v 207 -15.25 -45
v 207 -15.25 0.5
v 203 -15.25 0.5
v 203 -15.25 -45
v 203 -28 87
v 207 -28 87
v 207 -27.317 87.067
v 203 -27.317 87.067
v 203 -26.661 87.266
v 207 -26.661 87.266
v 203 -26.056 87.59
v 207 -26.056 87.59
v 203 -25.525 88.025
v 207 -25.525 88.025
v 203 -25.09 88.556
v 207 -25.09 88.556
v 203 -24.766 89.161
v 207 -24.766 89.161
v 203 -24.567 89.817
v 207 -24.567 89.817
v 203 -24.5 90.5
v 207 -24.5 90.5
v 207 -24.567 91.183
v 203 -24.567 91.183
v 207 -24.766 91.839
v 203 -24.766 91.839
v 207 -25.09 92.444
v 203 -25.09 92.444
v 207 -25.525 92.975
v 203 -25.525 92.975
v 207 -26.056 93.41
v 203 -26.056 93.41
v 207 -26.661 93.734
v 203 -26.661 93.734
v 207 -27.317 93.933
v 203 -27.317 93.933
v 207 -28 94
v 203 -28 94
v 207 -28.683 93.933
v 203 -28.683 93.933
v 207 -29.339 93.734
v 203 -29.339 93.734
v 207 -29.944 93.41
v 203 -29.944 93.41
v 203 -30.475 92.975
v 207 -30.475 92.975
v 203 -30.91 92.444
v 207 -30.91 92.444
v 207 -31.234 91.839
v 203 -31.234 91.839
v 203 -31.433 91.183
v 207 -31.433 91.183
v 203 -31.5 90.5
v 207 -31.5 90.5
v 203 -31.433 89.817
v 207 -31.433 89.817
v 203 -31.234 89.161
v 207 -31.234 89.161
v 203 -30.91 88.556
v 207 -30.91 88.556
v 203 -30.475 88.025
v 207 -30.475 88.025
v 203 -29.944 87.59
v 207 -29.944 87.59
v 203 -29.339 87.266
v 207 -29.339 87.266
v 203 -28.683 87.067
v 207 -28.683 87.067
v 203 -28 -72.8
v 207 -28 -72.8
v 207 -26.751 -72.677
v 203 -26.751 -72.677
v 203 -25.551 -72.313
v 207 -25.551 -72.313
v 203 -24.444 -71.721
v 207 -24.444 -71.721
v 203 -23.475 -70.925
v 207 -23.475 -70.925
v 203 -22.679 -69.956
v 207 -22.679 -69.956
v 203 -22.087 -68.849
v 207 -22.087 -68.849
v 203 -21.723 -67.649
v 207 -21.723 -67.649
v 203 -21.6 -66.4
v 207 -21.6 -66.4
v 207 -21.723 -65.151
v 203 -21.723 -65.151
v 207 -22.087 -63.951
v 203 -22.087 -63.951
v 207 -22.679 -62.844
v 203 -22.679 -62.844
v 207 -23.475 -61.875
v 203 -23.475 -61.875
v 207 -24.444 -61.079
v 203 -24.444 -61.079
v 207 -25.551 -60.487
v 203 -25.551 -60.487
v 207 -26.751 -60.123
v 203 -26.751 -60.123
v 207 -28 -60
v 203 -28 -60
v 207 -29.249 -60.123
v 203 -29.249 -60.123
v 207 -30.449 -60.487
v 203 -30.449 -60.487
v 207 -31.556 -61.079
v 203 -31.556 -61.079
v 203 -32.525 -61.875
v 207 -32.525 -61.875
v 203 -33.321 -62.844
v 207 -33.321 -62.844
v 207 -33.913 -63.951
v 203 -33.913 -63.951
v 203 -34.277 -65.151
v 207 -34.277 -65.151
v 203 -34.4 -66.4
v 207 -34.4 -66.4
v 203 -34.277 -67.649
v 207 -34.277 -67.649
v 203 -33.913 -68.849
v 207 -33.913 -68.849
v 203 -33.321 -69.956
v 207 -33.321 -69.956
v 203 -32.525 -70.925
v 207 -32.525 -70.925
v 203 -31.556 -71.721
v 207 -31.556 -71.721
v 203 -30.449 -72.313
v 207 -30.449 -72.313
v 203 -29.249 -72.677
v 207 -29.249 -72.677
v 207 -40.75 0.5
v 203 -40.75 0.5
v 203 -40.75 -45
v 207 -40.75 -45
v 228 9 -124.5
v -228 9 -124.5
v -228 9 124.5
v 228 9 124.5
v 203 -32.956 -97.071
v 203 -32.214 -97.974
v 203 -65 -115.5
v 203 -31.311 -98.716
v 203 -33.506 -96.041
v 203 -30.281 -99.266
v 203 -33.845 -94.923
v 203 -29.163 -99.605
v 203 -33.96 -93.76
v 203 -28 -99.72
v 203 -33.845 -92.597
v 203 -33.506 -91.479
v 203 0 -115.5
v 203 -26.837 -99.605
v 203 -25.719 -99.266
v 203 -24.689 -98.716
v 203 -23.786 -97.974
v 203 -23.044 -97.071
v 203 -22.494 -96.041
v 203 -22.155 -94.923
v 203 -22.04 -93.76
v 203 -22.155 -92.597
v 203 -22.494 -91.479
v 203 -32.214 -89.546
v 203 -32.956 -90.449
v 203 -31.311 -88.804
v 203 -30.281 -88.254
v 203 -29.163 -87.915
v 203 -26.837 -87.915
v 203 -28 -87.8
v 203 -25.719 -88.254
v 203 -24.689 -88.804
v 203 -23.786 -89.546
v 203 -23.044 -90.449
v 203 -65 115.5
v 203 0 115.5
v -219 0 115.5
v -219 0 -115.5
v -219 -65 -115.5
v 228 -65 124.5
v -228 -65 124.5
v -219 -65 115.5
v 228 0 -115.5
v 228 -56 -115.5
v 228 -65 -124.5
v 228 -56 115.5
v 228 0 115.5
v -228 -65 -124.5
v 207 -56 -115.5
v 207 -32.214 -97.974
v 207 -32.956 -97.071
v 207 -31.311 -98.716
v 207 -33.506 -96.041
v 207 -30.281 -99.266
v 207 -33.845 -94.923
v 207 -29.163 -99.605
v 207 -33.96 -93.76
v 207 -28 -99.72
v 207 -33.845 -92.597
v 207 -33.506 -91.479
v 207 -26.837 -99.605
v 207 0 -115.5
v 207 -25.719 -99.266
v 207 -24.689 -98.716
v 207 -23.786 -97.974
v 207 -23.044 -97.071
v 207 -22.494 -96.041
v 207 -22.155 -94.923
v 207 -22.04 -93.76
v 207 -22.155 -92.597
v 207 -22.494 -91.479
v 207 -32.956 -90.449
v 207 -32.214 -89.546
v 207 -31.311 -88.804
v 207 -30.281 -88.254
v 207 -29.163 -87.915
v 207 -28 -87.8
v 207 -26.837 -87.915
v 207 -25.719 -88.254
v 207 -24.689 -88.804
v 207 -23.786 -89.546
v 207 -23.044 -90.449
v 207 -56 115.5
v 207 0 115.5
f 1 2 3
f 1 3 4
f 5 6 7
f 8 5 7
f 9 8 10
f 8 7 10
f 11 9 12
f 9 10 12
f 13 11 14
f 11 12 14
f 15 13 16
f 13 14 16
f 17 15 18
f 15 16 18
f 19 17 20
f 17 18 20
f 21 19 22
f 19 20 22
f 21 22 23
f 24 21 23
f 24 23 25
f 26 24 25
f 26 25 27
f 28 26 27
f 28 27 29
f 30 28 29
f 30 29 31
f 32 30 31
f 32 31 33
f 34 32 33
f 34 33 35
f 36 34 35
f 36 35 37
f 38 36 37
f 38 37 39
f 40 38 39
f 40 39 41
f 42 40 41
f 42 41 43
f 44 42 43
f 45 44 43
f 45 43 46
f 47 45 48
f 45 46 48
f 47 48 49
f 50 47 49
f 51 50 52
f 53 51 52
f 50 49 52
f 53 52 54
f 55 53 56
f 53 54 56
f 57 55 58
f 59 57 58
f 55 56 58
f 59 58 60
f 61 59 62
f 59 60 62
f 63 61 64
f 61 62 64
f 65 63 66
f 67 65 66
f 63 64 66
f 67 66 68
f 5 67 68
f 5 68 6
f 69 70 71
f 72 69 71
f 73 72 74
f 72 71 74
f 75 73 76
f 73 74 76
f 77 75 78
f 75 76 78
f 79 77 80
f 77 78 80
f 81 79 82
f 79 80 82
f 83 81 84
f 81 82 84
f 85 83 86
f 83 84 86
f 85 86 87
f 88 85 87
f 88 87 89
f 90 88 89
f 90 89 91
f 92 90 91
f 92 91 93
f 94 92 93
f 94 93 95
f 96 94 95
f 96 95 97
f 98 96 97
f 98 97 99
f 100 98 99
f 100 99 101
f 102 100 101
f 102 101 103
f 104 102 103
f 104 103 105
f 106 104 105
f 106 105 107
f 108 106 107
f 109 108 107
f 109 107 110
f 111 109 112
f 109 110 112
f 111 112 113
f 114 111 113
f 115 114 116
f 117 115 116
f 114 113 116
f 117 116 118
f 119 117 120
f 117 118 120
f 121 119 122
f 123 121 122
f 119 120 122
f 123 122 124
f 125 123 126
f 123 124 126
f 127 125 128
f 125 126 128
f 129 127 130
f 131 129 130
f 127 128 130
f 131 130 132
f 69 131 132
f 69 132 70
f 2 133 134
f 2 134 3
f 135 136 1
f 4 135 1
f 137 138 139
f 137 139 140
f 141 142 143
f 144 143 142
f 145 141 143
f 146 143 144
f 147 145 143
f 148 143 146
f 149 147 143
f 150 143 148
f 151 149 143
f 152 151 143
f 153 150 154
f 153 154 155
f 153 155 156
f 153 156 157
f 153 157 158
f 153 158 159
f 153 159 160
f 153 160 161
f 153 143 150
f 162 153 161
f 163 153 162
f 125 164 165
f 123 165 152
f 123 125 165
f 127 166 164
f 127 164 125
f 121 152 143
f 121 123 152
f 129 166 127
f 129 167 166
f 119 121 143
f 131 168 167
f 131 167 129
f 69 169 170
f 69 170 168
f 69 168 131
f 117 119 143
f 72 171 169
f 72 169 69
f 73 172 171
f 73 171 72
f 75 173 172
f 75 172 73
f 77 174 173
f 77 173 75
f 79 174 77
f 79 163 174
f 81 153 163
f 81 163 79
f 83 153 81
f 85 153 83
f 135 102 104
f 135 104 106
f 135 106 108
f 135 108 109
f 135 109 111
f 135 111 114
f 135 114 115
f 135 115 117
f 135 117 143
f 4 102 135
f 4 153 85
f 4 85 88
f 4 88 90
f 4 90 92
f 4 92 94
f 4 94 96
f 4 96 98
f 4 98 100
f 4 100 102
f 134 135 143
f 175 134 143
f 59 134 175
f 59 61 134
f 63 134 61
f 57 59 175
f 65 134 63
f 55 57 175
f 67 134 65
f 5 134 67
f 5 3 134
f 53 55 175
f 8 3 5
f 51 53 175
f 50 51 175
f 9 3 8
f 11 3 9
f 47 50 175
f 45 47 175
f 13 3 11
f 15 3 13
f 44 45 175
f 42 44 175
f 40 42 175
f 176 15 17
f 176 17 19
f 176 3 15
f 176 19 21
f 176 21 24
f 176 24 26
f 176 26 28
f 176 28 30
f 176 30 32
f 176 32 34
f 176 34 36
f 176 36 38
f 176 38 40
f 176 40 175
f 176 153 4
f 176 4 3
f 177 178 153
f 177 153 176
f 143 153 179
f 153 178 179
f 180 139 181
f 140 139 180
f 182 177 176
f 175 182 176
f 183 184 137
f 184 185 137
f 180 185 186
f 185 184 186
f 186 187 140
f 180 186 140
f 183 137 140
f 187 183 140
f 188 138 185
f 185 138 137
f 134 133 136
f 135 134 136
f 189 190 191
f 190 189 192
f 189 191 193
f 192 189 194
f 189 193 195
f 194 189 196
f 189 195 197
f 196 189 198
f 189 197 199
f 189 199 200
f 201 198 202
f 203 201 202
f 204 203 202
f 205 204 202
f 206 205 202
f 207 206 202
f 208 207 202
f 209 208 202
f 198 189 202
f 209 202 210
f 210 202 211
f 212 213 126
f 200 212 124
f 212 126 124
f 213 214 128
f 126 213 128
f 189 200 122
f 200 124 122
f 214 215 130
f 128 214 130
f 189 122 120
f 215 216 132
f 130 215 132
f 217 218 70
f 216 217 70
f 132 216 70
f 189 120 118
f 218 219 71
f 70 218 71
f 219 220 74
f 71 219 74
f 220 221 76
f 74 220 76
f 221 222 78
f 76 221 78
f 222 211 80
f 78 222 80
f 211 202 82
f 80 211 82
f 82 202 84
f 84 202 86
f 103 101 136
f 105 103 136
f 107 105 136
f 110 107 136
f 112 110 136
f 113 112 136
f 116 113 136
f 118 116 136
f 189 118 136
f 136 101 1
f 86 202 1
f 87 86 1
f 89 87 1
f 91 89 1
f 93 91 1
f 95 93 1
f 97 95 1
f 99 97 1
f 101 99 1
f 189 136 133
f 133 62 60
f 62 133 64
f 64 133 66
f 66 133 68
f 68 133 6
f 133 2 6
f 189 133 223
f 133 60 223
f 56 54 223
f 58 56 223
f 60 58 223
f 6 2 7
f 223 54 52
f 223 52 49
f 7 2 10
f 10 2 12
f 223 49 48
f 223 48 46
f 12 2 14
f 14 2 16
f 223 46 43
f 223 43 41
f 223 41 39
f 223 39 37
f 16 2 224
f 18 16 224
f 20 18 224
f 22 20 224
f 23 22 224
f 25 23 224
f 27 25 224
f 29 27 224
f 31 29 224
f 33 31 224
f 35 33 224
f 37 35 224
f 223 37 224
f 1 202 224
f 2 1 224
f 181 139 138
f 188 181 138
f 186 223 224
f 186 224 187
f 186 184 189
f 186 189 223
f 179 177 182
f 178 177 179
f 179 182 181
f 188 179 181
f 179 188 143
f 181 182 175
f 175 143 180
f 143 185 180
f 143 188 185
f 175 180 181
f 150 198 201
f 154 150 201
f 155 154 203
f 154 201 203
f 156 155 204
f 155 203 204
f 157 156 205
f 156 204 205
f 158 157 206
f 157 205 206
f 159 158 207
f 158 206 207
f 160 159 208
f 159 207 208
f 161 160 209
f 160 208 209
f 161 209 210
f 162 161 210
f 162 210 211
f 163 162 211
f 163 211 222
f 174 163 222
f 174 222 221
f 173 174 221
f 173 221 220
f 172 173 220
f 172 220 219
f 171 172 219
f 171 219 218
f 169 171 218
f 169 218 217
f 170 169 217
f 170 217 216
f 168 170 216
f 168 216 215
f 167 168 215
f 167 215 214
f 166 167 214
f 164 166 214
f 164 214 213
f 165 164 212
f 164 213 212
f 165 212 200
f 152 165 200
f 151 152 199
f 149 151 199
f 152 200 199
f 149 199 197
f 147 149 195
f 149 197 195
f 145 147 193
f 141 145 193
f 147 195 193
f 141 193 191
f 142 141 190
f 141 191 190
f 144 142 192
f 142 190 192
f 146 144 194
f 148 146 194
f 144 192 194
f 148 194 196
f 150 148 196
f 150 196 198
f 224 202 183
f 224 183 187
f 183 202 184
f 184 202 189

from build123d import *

# Parameters (mm, degrees)
SKETCH1_W           = 456
SKETCH1_H           = 249
SKETCH1_W_2         = 438
SKETCH1_H_2         = 231
BOSS_EXTRUDE4_DEPTH = 9
SKETCH1_5_W         = 456
SKETCH1_5_H         = 249
SKETCH1_5_W_2       = 438
SKETCH1_5_H_2       = 231
BOSS_EXTRUDE5_DEPTH = 65
SKETCH5_W           = 231
SKETCH5_H           = 56
SKETCH5_H_2         = 9
CUT_EXTRUDE1_DEPTH  = 469.544821762
SKETCH6_W           = 4
SKETCH6_H           = 231
BOSS_EXTRUDE6_DEPTH = 65
BOSS_EXTRUDE7_START = -9
SKETCH5_3_W         = 231
SKETCH5_3_H         = 9
BOSS_EXTRUDE7_DEPTH = 21
SKETCH7_R           = 3.5
SKETCH7_R_2         = 6.4
SKETCH7_R_3         = 5.96
SKETCH7_W           = 45.5
SKETCH7_H           = 25.5
CUT_EXTRUDE2_DEPTH  = 150


with BuildPart() as part:
    # Sketch1 → Boss-Extrude4 (new body)
    with BuildSketch(Plane(origin=(0, 0, 0), x_dir=(1, 0, 0), z_dir=(0, 1, 0))):
        Rectangle(SKETCH1_W, SKETCH1_H)
        Rectangle(SKETCH1_W_2, SKETCH1_H_2, mode=Mode.SUBTRACT)
        Rectangle(SKETCH1_W_2, SKETCH1_H_2)
    extrude(amount=BOSS_EXTRUDE4_DEPTH)

    # Sketch1<5> → Boss-Extrude5 (add)
    with BuildSketch(Plane(origin=(0, 0, 0), x_dir=(1, 0, 0), z_dir=(0, 1, 0))):
        Rectangle(SKETCH1_5_W, SKETCH1_5_H)
        Rectangle(SKETCH1_5_W_2, SKETCH1_5_H_2, mode=Mode.SUBTRACT)
    extrude(amount=-BOSS_EXTRUDE5_DEPTH)

    # Sketch5 → Cut-Extrude1 (cut, through all)
    with BuildSketch(Plane.ZY.offset(-219)):
        with Locations((0, -28)):
            Rectangle(SKETCH5_W, SKETCH5_H)
        with Locations((0, -60.5)):
            Rectangle(SKETCH5_W, SKETCH5_H_2)
    extrude(amount=-CUT_EXTRUDE1_DEPTH, mode=Mode.SUBTRACT)

    # Sketch6 → Boss-Extrude6 (add)
    with BuildSketch(Plane.XZ):
        with Locations((205, 0)):
            Rectangle(SKETCH6_W, SKETCH6_H)
    extrude(amount=BOSS_EXTRUDE6_DEPTH)

    # Sketch5<3> → Boss-Extrude7 (add)
    with BuildSketch(Plane.ZY.offset(-219).offset(BOSS_EXTRUDE7_START)):
        with Locations((0, -60.5)):
            Rectangle(SKETCH5_3_W, SKETCH5_3_H)
    extrude(amount=BOSS_EXTRUDE7_DEPTH)

    # Sketch7 → Cut-Extrude2 (cut)
    with BuildSketch(Plane(origin=(207, 0, 0), x_dir=(0, 0, -1), z_dir=(1, 0, 0))):
        with Locations((-90.5, -28)):
            Circle(SKETCH7_R)
        with Locations((66.4, -28)):
            Circle(SKETCH7_R_2)
        with Locations((93.76, -28)):
            Circle(SKETCH7_R_3)
        with Locations((22.25, -28)):
            Rectangle(SKETCH7_W, SKETCH7_H)
    extrude(amount=-CUT_EXTRUDE2_DEPTH, mode=Mode.SUBTRACT)


solid = part.part
